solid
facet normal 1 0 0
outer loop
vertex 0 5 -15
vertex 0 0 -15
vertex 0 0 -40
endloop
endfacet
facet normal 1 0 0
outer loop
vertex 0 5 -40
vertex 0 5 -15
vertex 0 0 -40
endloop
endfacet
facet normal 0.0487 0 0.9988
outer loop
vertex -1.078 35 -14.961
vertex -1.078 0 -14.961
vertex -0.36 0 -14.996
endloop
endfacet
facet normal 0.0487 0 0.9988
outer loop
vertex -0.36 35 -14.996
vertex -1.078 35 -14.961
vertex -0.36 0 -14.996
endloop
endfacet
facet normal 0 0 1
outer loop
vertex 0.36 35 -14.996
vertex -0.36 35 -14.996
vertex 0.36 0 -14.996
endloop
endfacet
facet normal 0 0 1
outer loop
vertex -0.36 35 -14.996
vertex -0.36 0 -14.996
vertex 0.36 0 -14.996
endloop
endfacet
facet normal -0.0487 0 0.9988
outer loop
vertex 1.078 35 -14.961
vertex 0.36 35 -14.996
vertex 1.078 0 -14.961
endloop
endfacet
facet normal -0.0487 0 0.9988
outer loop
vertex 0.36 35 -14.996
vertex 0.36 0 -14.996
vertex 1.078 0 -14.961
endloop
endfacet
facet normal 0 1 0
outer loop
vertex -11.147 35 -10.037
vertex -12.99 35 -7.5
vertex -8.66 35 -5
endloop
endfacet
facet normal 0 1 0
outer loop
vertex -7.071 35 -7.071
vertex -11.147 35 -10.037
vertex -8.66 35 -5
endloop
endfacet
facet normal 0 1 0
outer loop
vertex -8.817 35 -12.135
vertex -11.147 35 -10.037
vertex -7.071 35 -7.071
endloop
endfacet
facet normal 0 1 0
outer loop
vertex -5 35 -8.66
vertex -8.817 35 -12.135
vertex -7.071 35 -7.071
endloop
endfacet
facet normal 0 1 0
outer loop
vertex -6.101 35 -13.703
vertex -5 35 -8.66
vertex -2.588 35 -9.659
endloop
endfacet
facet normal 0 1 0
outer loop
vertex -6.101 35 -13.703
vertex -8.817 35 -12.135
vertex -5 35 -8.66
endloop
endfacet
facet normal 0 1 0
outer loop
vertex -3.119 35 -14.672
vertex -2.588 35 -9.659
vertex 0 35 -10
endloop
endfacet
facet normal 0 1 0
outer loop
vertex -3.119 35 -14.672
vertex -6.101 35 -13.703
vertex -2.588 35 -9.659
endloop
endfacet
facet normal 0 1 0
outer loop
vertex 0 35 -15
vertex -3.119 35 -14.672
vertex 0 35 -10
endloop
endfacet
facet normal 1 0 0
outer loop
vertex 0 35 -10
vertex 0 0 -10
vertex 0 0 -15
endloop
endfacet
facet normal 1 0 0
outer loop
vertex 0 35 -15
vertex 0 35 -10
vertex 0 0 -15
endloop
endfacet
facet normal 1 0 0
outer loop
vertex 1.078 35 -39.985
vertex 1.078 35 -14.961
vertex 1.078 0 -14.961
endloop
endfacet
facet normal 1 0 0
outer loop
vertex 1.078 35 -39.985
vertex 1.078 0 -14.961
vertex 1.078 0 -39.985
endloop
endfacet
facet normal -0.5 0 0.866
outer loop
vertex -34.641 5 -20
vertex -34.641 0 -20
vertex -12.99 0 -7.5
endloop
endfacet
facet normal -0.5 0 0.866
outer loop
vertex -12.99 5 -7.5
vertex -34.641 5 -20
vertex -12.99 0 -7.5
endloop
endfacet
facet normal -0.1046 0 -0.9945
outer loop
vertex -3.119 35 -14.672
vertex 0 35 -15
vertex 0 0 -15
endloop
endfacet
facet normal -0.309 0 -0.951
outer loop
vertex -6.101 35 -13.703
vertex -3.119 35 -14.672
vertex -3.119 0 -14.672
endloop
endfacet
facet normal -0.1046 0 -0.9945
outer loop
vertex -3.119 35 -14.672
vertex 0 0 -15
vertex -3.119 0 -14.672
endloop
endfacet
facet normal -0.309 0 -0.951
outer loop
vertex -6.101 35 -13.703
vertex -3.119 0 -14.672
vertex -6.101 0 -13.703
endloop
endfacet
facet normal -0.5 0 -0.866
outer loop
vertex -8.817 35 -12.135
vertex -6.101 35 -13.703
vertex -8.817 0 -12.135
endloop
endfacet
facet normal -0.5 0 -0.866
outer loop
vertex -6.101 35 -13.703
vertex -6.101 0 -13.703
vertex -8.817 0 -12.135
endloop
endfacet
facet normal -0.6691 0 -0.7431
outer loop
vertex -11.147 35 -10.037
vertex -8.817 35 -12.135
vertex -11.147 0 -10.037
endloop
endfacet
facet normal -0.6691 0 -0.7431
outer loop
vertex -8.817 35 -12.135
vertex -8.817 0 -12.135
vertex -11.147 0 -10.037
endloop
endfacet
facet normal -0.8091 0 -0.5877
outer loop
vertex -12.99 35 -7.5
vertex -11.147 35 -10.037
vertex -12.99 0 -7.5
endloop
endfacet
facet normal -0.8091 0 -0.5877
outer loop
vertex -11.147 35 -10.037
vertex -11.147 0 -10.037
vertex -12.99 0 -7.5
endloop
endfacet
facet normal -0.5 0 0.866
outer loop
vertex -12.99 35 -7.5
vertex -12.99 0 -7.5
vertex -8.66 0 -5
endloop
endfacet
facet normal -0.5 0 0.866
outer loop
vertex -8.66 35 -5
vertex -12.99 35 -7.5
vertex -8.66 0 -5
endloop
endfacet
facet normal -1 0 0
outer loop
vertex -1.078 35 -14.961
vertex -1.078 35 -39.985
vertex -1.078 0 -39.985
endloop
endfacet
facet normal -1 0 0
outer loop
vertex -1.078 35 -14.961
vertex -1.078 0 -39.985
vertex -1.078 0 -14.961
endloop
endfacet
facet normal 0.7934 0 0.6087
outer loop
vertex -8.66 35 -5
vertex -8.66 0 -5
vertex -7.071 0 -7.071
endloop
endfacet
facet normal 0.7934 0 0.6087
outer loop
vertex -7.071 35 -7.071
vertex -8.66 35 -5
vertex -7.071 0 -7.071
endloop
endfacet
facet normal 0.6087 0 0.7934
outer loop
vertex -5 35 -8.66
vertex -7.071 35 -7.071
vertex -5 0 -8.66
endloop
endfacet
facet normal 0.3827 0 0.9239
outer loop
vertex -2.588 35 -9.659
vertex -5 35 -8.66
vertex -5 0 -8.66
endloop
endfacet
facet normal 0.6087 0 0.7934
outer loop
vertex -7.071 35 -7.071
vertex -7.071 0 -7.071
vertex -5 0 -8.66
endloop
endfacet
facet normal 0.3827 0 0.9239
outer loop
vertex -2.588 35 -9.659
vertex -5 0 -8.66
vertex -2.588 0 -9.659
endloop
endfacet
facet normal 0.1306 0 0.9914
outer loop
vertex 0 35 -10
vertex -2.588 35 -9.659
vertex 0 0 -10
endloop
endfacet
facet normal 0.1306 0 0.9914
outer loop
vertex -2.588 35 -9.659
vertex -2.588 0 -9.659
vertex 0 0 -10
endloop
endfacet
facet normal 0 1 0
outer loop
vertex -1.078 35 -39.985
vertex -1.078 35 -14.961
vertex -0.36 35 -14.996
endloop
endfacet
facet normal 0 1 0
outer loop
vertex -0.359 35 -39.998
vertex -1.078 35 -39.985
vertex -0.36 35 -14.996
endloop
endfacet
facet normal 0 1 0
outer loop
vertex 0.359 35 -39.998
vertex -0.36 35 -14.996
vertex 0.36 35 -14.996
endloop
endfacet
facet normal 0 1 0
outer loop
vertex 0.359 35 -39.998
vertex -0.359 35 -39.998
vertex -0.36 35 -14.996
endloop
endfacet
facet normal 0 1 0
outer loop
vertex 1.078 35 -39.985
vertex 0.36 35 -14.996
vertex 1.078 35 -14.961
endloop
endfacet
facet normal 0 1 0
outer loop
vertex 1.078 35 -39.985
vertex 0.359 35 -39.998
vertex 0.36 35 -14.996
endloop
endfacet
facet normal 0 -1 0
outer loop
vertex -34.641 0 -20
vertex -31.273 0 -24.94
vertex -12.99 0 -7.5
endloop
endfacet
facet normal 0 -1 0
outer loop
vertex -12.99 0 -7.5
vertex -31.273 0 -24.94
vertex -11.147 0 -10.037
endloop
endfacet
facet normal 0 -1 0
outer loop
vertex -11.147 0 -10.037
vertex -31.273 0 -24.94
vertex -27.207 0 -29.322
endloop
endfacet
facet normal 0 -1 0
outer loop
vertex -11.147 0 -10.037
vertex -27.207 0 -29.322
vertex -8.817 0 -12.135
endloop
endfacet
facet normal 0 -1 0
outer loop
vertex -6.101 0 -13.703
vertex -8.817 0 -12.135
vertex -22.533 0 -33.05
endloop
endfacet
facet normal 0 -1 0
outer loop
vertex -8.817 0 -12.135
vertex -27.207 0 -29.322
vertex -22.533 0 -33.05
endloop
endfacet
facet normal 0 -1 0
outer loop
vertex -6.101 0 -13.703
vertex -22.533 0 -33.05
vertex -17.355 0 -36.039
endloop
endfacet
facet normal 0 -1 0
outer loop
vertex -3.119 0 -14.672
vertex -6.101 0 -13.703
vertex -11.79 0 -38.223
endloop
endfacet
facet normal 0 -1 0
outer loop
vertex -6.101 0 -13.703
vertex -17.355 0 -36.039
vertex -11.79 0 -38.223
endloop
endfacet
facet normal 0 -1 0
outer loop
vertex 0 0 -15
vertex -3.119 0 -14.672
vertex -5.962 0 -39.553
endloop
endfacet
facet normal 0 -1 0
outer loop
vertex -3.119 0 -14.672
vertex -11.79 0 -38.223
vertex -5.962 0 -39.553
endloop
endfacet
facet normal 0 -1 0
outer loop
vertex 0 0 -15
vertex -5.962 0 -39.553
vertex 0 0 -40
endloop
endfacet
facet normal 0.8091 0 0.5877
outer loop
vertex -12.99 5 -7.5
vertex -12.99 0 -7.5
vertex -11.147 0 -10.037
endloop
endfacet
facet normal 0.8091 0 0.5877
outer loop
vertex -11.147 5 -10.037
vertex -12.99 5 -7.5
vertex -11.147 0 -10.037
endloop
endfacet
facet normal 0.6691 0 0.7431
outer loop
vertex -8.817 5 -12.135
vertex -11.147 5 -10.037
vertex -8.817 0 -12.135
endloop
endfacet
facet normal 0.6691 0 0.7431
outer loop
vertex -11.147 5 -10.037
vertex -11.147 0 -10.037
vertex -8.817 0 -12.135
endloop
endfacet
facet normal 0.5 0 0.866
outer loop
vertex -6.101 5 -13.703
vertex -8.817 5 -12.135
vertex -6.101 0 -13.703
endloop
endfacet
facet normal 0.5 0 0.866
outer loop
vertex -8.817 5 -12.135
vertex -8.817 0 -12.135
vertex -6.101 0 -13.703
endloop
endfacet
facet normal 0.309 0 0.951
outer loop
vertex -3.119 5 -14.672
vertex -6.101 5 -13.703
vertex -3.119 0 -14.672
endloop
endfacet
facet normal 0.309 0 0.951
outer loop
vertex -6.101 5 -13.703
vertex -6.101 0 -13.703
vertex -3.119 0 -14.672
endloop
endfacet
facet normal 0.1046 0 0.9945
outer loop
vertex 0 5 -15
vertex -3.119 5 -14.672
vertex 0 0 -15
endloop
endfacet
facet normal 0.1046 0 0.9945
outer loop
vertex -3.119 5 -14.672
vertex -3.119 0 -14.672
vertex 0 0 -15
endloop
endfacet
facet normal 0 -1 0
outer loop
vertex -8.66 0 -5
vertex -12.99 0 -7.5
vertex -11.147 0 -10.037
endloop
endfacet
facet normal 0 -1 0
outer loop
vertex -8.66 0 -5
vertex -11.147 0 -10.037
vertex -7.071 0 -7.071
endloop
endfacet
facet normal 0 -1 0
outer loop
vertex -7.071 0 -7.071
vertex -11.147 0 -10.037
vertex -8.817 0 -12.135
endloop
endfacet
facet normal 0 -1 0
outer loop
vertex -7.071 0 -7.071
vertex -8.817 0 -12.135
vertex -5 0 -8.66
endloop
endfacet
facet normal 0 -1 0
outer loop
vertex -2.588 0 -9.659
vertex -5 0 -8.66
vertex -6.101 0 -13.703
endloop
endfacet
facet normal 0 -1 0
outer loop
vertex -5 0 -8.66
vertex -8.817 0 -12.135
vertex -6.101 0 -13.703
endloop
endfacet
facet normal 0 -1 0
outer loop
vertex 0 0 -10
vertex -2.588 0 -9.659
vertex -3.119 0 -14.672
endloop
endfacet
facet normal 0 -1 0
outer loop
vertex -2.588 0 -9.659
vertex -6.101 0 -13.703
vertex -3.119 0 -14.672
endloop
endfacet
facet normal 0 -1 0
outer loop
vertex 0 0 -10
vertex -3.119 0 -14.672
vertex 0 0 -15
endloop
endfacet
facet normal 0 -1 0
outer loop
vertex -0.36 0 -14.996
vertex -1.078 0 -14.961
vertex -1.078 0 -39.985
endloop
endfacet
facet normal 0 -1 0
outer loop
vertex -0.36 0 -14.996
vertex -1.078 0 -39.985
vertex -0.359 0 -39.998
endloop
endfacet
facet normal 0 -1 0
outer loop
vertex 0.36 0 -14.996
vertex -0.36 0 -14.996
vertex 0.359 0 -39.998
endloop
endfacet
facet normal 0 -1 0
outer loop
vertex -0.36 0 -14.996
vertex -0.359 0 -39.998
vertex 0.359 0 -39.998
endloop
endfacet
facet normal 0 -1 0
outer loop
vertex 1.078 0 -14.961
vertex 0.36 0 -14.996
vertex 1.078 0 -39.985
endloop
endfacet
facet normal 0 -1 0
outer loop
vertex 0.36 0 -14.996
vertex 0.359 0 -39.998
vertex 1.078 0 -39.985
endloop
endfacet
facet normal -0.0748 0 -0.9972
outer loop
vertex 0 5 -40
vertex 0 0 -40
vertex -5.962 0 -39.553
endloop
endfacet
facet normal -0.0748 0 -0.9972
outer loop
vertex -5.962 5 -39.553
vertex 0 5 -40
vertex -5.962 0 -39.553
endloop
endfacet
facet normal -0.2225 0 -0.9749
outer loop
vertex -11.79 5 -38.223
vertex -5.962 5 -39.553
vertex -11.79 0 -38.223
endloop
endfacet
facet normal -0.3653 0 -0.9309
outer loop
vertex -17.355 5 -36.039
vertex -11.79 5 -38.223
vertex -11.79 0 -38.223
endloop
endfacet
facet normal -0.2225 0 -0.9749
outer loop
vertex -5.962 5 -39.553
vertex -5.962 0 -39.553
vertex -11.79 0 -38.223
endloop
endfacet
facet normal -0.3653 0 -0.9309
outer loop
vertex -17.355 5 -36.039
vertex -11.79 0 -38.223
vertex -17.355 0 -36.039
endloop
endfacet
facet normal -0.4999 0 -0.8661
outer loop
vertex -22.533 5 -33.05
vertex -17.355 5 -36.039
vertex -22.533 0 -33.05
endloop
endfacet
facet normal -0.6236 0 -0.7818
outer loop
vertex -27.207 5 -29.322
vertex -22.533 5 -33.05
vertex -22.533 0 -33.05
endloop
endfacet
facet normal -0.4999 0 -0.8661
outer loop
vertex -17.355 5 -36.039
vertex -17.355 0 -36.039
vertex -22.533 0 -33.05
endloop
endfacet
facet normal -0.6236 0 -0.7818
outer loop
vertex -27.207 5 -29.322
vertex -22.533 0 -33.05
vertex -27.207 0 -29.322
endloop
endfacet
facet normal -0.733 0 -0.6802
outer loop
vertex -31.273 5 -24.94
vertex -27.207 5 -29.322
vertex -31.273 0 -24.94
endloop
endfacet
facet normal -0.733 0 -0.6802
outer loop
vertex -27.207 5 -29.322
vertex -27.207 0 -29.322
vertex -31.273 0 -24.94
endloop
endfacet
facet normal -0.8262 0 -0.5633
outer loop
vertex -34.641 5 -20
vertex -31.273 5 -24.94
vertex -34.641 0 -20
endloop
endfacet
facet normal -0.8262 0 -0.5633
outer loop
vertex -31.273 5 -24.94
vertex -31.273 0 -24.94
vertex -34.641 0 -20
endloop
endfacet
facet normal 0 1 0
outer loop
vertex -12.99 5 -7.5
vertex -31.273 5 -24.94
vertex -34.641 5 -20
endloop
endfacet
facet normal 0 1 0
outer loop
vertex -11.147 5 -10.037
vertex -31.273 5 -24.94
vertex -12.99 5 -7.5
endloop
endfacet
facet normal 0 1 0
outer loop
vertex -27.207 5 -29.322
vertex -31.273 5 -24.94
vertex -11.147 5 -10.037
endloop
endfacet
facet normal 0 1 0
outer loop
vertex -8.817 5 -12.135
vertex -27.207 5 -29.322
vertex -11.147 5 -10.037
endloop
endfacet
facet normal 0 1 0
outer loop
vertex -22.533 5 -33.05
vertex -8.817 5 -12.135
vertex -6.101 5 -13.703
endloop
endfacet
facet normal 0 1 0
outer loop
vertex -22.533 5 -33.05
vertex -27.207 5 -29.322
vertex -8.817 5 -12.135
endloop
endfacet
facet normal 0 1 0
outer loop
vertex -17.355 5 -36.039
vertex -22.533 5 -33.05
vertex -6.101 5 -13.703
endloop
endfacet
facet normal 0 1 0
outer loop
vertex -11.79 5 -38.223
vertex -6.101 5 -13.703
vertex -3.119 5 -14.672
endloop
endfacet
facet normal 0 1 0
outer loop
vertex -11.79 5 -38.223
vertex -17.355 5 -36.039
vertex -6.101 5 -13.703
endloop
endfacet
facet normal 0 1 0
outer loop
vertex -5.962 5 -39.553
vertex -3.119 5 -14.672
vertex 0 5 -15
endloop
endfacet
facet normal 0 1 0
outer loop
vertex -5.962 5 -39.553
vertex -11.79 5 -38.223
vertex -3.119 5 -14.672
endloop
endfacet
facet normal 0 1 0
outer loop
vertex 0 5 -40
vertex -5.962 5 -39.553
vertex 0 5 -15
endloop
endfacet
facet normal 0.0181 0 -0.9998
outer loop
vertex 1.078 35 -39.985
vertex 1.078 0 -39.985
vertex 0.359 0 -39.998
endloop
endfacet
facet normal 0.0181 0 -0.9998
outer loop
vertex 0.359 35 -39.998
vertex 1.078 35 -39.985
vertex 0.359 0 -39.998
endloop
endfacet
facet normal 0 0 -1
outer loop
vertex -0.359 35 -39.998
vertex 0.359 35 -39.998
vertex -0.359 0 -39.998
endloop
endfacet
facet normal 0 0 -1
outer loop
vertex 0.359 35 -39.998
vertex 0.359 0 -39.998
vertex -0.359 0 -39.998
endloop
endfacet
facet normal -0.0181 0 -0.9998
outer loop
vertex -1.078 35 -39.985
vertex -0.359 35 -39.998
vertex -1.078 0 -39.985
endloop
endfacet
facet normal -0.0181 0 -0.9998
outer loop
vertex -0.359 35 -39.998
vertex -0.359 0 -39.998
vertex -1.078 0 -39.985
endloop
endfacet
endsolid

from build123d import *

# Parameters (mm, degrees)
EXTRUDE_313_DEPTH = 5
EXTRUDE_435_DEPTH = 35
EXTRUDE_605_DEPTH = 35


with BuildPart() as part:
    # 草图1 → Extrude 313 (new body)
    with BuildSketch(Plane(origin=(0, 0, 0), x_dir=(1, 0, 0), z_dir=(0, 1, 0))):
        with BuildLine():
            Line((0, 15), (0, 40))
            ThreePointArc((0, 40), (-20, 34.641016151), (-34.641016151, 20))
            Line((-34.641016151, 20), (-12.990381057, 7.5))
            ThreePointArc((-12.990381057, 7.5), (-7.5, 12.990381057), (0, 15))
        make_face()
    extrude(amount=EXTRUDE_313_DEPTH)


with BuildPart() as body_2:
    # 草图2 → Extrude 435 (new body)
    with BuildSketch(Plane(origin=(0, 0, 0), x_dir=(1, 0, 0), z_dir=(0, 1, 0))):
        with BuildLine():
            Line((0, 10), (0, 15))
            ThreePointArc((0, 15), (-7.5, 12.990381057), (-12.990381057, 7.5))
            Line((-12.990381057, 7.5), (-8.660254038, 5))
            ThreePointArc((-8.660254038, 5), (-5, 8.660254038), (0, 10))
        make_face()
    extrude(amount=EXTRUDE_435_DEPTH)


with BuildPart() as body_3:
    # 草图5 → Extrude 605 (new body)
    with BuildSketch(Plane(origin=(0, 0, 0), x_dir=(1, 0, 0), z_dir=(0, 1, 0))):
        with BuildLine():
            Line((1.077839907, 14.961225255), (1.077839907, 39.985475627))
            ThreePointArc((1.077839907, 39.985475627), (0, 40), (-1.077839907, 39.985475627))
            Line((-1.077839907, 39.985475627), (-1.077839907, 14.961225255))
            ThreePointArc((-1.077839907, 14.961225255), (0, 15), (1.077839907, 14.961225255))
        make_face()
    extrude(amount=EXTRUDE_605_DEPTH)


solid = Compound([part.part, body_2.part, body_3.part])
